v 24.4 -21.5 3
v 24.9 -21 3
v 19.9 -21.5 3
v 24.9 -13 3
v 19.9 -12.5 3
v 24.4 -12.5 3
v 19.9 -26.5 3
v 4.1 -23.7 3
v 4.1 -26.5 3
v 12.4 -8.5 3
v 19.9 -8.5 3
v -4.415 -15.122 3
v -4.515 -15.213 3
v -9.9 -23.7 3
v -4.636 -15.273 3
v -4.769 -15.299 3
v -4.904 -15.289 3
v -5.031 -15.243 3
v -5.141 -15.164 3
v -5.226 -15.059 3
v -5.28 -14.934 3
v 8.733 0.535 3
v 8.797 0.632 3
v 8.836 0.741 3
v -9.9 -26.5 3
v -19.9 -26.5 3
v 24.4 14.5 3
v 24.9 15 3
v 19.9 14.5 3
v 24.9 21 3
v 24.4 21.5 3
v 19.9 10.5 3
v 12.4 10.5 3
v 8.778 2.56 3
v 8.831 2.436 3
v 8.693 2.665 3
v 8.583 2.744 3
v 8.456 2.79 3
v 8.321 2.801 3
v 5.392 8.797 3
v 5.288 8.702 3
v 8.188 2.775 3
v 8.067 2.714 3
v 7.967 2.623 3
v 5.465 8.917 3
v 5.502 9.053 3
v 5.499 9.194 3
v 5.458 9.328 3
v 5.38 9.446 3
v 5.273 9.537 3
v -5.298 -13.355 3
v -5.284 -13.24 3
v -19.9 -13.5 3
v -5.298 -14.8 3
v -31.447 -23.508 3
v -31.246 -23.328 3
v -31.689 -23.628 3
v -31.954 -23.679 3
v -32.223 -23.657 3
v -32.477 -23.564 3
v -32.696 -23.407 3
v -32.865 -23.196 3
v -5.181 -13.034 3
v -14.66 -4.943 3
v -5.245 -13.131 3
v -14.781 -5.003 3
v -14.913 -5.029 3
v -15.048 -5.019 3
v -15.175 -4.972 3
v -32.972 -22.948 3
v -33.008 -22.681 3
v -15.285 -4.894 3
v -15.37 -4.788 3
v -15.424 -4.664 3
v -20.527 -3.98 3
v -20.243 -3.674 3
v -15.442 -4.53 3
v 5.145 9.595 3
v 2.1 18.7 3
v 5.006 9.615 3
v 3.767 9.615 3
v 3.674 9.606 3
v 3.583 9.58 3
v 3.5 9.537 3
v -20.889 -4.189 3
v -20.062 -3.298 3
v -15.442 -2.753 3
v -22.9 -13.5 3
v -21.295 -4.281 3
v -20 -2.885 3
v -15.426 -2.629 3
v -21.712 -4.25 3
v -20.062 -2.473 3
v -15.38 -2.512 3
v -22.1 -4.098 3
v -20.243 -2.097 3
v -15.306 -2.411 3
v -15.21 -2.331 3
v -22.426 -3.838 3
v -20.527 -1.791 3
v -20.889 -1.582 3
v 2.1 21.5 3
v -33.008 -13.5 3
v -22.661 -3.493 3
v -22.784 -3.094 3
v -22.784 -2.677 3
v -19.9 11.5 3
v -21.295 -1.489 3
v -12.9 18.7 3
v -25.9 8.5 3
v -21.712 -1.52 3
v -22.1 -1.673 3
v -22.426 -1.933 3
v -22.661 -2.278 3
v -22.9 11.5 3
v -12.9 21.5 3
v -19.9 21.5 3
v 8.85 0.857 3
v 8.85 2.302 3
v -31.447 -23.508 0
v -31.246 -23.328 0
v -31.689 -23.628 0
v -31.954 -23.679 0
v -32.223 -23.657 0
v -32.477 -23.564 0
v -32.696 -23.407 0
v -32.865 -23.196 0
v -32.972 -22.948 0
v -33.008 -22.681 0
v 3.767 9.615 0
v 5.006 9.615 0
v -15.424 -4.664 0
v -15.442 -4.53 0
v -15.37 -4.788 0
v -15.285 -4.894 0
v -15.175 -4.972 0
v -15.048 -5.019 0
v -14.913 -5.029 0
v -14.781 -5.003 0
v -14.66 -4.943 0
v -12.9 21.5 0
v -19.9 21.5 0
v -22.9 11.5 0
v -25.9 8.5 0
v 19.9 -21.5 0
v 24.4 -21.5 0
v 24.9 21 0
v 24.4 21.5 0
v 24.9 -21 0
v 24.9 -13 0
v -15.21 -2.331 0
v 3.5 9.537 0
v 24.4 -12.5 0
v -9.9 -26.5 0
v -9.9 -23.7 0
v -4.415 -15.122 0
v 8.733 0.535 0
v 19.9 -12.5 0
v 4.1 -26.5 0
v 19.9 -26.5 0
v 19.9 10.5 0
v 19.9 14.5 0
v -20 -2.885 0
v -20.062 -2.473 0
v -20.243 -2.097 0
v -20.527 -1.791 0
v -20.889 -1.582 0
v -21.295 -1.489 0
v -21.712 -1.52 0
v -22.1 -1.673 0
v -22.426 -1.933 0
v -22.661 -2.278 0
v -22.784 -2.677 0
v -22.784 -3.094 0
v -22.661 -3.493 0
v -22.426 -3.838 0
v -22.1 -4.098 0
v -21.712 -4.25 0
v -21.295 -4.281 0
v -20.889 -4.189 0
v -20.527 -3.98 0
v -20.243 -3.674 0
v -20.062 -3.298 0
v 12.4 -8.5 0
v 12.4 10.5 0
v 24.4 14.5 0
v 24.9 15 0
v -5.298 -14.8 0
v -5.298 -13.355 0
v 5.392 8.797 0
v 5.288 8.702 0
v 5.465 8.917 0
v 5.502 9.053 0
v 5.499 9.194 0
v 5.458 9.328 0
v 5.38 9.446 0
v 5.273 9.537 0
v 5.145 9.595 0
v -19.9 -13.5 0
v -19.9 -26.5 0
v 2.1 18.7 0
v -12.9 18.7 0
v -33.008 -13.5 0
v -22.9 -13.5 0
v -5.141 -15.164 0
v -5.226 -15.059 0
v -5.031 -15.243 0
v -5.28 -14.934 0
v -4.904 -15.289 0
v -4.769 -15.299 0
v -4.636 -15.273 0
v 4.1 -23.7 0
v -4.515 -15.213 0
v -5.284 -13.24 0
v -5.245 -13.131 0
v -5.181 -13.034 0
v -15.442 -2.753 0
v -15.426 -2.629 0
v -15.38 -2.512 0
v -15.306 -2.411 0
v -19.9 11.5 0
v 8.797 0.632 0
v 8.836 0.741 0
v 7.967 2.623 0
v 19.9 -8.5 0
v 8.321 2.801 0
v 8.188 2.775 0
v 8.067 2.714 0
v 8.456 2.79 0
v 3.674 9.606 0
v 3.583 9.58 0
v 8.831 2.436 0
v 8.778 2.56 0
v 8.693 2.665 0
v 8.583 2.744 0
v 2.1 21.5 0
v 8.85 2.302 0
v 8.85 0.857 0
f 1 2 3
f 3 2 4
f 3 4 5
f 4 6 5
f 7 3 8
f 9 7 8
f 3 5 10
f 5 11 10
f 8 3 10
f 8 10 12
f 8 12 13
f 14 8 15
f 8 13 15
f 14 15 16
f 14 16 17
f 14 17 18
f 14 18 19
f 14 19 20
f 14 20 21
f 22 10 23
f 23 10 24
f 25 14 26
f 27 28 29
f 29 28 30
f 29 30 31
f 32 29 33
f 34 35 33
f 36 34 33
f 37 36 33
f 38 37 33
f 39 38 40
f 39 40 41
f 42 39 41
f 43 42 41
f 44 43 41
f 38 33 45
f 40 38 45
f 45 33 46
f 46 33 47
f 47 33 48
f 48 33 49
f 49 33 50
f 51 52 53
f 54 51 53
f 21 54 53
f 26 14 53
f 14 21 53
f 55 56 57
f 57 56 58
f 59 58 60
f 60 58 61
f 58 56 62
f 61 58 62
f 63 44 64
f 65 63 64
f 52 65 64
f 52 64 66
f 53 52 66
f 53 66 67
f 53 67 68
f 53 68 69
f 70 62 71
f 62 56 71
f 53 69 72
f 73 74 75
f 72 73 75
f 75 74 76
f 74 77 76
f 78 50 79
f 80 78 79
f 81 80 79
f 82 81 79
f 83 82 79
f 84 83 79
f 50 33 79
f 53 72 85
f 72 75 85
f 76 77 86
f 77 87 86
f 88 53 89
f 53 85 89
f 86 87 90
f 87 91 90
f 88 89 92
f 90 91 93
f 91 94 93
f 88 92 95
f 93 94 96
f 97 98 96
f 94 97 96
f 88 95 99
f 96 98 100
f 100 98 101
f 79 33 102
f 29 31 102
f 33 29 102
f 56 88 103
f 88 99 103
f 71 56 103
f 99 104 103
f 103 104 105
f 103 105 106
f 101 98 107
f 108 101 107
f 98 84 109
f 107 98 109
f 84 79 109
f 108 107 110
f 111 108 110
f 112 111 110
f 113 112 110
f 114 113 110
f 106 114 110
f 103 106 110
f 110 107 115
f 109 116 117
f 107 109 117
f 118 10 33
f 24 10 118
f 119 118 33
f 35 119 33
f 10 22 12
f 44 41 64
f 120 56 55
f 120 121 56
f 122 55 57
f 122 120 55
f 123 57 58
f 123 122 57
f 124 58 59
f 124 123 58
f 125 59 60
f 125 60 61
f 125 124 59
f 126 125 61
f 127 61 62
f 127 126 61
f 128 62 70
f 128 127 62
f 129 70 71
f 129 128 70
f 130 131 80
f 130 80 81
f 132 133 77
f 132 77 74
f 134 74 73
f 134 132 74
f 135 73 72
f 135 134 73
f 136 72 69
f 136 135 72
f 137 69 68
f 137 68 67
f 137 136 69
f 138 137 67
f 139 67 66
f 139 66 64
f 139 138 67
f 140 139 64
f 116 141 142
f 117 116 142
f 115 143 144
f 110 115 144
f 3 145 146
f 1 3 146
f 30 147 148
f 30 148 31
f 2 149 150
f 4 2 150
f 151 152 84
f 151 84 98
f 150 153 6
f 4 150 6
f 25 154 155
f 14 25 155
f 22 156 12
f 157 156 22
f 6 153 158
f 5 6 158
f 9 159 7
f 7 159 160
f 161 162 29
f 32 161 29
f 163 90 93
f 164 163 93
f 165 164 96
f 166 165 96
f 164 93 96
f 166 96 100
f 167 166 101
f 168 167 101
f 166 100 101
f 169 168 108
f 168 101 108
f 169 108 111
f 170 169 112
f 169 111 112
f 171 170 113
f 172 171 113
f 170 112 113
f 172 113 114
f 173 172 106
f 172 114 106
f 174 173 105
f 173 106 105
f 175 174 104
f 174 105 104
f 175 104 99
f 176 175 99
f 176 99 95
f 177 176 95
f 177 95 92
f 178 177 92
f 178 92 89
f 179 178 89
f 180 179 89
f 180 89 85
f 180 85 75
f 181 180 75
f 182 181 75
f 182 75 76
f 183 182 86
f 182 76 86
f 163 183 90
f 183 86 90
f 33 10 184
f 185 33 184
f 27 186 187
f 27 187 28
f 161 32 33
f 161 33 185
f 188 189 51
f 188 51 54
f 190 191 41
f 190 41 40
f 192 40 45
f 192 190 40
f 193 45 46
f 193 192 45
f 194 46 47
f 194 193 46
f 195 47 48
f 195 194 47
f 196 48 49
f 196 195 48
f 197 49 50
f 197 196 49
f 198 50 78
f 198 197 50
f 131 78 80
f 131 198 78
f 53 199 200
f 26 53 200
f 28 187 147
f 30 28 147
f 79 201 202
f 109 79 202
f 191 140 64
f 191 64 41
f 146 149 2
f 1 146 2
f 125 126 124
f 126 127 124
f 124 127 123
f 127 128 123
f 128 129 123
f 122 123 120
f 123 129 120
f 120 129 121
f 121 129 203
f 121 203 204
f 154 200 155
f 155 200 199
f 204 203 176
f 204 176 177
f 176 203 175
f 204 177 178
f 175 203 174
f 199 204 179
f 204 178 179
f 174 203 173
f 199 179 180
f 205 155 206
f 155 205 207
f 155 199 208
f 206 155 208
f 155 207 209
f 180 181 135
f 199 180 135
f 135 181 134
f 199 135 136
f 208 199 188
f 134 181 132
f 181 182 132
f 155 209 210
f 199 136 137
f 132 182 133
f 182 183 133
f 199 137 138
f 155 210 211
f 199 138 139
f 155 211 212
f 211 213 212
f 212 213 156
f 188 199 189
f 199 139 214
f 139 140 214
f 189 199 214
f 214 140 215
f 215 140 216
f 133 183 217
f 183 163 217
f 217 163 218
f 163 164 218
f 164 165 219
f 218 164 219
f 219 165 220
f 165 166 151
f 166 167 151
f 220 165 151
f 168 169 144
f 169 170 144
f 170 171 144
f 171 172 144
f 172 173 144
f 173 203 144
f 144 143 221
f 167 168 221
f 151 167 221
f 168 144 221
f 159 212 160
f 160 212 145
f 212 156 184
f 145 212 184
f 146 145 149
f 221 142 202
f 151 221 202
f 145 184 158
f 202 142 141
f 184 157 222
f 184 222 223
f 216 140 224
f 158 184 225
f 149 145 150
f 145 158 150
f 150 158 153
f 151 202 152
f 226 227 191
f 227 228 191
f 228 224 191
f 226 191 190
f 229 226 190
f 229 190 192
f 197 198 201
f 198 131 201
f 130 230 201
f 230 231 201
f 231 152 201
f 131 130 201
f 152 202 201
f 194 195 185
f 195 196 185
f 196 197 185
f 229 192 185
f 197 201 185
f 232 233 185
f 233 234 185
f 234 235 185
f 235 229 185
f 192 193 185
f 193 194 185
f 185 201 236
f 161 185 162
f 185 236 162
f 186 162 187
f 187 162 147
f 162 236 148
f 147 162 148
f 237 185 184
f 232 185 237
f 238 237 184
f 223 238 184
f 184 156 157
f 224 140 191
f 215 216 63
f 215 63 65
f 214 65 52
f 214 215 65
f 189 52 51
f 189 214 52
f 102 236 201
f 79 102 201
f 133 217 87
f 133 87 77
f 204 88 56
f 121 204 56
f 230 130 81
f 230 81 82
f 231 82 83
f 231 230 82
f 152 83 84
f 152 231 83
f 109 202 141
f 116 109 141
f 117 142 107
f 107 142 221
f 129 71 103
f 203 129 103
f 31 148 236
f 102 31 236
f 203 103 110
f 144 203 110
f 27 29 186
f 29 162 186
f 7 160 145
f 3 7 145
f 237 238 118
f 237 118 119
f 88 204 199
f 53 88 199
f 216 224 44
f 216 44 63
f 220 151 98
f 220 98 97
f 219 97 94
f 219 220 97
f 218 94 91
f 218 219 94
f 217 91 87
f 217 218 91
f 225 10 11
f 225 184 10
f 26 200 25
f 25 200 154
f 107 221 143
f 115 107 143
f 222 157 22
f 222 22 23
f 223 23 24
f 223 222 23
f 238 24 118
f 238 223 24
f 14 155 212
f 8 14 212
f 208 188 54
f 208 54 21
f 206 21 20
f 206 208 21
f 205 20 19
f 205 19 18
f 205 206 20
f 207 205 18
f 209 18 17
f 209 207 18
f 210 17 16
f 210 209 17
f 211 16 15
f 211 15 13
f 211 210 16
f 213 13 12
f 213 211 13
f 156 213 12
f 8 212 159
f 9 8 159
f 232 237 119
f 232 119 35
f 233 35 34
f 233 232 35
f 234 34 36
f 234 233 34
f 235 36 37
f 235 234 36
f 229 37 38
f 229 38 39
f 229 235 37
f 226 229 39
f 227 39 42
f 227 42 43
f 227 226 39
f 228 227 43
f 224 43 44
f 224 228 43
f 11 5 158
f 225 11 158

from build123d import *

# Parameters (mm, degrees)
SKETCH_1_R          = 1.8
EXTRUDE_1_DEPTH     = 3
SKETCH_2_W          = 3
SKETCH_2_H          = 27
CUT_EXTRUDE_1_DEPTH = 2
SKETCH_3_W          = 6
SKETCH_3_H          = 3
EXTRUDE_2_DEPTH     = 5
SKETCH_4_W          = 6
SKETCH_4_H          = 3
EXTRUDE_3_DEPTH     = 5
SKETCH_5_W          = 6
SKETCH_5_H          = 3
CUT_EXTRUDE_2_DEPTH = 1
SKETCH_6_W          = 6
SKETCH_6_H          = 3
CUT_EXTRUDE_3_DEPTH = 1
SKETCH_8_W          = 3
SKETCH_8_H          = 19
CUT_EXTRUDE_4_DEPTH = 1.5
EXTRUDE_5_DEPTH     = 3
FILLET_2_R          = 1
CHAMFER_1_SIZE      = 0.5
EXTRUDE_START       = -3
SKETCH_11_R         = 1.8
EXTRUDE_6_DEPTH     = 3
SKETCH_12_R         = 1.4
CUT_EXTRUDE_5_DEPTH = 3


with BuildPart() as part:
    # 草图1 → 凸台-拉伸1 (new body)
    with BuildSketch(Plane.XY):
        Polygon((24.9, -12.5), (15.9, -12.5), (15.9, 14.5), (24.9, 14.5), (24.9, 21.5), (2.1, 21.5), (2.1, 18.7), (-12.9, 18.7), (-12.9, 21.5), (-19.9, 21.5), (-19.9, 11.5), (-22.9, 11.5), (-25.9, 8.5), (-25.9, -10.5), (-22.9, -13.5), (-19.9, -13.5), (-19.9, -26.5), (-9.9, -26.5), (-9.9, -23.7), (4.1, -23.7), (4.1, -26.5), (19.9, -26.5), (19.9, -21.5), (24.9, -21.5), align=None)
        with Locations((-21.4, -1.053344625)):
            Circle(SKETCH_1_R, mode=Mode.SUBTRACT)
        with BuildLine():
            Line((3.499503129, 9.537046136), (-15.209877372, -2.33076439))
            ThreePointArc((-15.209877372, -2.33076439), (-15.380180828, -2.512061787), (-15.442052841, -2.752984736))
            Line((-15.442052841, -2.752984736), (-15.442052841, -4.530228968))
            ThreePointArc((-15.442052841, -4.530228968), (-15.175347113, -4.972466215), (-14.65975771, -4.942914635))
            Line((-14.65975771, -4.942914635), (5.287871242, 8.702140123))
            ThreePointArc((5.287871242, 8.702140123), (5.483249029, 9.262570784), (5.005576111, 9.61482579))
            Line((5.005576111, 9.61482579), (3.767327661, 9.61482579))
            ThreePointArc((3.767327661, 9.61482579), (3.627882641, 9.594987311), (3.499503129, 9.537046136))
        make_face(mode=Mode.SUBTRACT)
        with BuildLine():
            Line((7.966853478, 2.623077919), (-5.180839485, -13.033716755))
            ThreePointArc((-5.180839485, -13.033716755), (-5.267752705, -13.184156416), (-5.297938704, -13.355255232))
            Line((-5.297938704, -13.355255232), (-5.297938704, -14.80023138))
            ThreePointArc((-5.297938704, -14.80023138), (-4.96903752, -15.270045381), (-4.415037923, -15.121769857))
            Line((-4.415037923, -15.121769857), (8.732655041, 0.535024817))
            ThreePointArc((8.732655041, 0.535024817), (8.81956826, 0.685464478), (8.849754259, 0.856563293))
            Line((8.849754259, 0.856563293), (8.849754259, 2.301539442))
            ThreePointArc((8.849754259, 2.301539442), (8.520853075, 2.771353443), (7.966853478, 2.623077919))
        make_face(mode=Mode.SUBTRACT)
    extrude(amount=EXTRUDE_1_DEPTH)

    # 草图2 → 切除-拉伸1 (cut)
    with BuildSketch(Plane(origin=(15.9, 0, 0), x_dir=(0, 0, -1), z_dir=(1, 0, 0))):
        with Locations((-1.5, 1)):
            Rectangle(SKETCH_2_W, SKETCH_2_H)
    extrude(amount=-CUT_EXTRUDE_1_DEPTH, mode=Mode.SUBTRACT)

    # 草图3 → 凸台-拉伸2 (add)
    with BuildSketch(Plane.XZ.offset(-14.5)):
        with Locations((16.9, 1.5)):
            Rectangle(SKETCH_3_W, SKETCH_3_H)
    extrude(amount=EXTRUDE_2_DEPTH)

    # 草图4 → 凸台-拉伸3 (add)
    with BuildSketch(Plane(origin=(0, -12.5, 0), x_dir=(1, 0, 0), z_dir=(0, 1, 0))):
        with Locations((16.9, -1.5)):
            Rectangle(SKETCH_4_W, SKETCH_4_H)
    extrude(amount=EXTRUDE_3_DEPTH)

    # 草图5 → 切除-拉伸2 (cut)
    with BuildSketch(Plane(origin=(0, -7.5, 0), x_dir=(1, 0, 0), z_dir=(0, 1, 0))):
        with Locations((16.9, -1.5)):
            Rectangle(SKETCH_5_W, SKETCH_5_H)
    extrude(amount=-CUT_EXTRUDE_2_DEPTH, mode=Mode.SUBTRACT)

    # 草图6 → 切除-拉伸3 (cut)
    with BuildSketch(Plane.XZ.offset(-9.5)):
        with Locations((16.9, 1.5)):
            Rectangle(SKETCH_6_W, SKETCH_6_H)
    extrude(amount=-CUT_EXTRUDE_3_DEPTH, mode=Mode.SUBTRACT)

    # 草图8 → 切除-拉伸4 (cut)
    with BuildSketch(Plane(origin=(13.9, 0, 0), x_dir=(0, 0, -1), z_dir=(1, 0, 0))):
        with Locations((-1.5, 1)):
            Rectangle(SKETCH_8_W, SKETCH_8_H)
    extrude(amount=-CUT_EXTRUDE_4_DEPTH, mode=Mode.SUBTRACT)

    # 草图10 → 凸台-拉伸5 (add)
    with BuildSketch(Plane.XY.offset(3)):
        Polygon((-25.9, -10.5), (-22.9, -13.5), (-33.008159317, -25.40304294), (-33.008159317, -13.5), (-25.9, 8.5), align=None)
    extrude(amount=-EXTRUDE_5_DEPTH)

    # 圆角2
    fillet_2_edges = [part.edges().sort_by_distance(p)[0] for p in [
        (-33.008159317, -25.40304294, 1.5),
    ]]
    fillet(fillet_2_edges, radius=FILLET_2_R)

    # 倒角1
    chamfer_1_edges = [part.edges().sort_by_distance(p)[0] for p in [
        (24.9, -21.5, 1.5),
        (24.9, 21.5, 1.5),
        (24.9, 14.5, 1.5),
        (24.9, -12.5, 1.5),
    ]]
    chamfer(chamfer_1_edges, length=CHAMFER_1_SIZE)

    # 草图11 → 凸台-拉伸6 (add)
    with BuildSketch(Plane.XY.offset(3).offset(EXTRUDE_START)):
        with Locations((-21.4, -1.053344625)):
            Circle(SKETCH_11_R)
    extrude(amount=EXTRUDE_6_DEPTH)

    # 草图12 → 切除-拉伸5 (cut)
    with BuildSketch(Plane(origin=(175.843153128, -50.872452405, 3), x_dir=(1, 0, 0), z_dir=(0, 0, 1))):
        with Locations((-197.243153128, 47.987065257)):
            Circle(SKETCH_12_R)
    extrude(amount=-CUT_EXTRUDE_5_DEPTH, mode=Mode.SUBTRACT)


solid = part.part
